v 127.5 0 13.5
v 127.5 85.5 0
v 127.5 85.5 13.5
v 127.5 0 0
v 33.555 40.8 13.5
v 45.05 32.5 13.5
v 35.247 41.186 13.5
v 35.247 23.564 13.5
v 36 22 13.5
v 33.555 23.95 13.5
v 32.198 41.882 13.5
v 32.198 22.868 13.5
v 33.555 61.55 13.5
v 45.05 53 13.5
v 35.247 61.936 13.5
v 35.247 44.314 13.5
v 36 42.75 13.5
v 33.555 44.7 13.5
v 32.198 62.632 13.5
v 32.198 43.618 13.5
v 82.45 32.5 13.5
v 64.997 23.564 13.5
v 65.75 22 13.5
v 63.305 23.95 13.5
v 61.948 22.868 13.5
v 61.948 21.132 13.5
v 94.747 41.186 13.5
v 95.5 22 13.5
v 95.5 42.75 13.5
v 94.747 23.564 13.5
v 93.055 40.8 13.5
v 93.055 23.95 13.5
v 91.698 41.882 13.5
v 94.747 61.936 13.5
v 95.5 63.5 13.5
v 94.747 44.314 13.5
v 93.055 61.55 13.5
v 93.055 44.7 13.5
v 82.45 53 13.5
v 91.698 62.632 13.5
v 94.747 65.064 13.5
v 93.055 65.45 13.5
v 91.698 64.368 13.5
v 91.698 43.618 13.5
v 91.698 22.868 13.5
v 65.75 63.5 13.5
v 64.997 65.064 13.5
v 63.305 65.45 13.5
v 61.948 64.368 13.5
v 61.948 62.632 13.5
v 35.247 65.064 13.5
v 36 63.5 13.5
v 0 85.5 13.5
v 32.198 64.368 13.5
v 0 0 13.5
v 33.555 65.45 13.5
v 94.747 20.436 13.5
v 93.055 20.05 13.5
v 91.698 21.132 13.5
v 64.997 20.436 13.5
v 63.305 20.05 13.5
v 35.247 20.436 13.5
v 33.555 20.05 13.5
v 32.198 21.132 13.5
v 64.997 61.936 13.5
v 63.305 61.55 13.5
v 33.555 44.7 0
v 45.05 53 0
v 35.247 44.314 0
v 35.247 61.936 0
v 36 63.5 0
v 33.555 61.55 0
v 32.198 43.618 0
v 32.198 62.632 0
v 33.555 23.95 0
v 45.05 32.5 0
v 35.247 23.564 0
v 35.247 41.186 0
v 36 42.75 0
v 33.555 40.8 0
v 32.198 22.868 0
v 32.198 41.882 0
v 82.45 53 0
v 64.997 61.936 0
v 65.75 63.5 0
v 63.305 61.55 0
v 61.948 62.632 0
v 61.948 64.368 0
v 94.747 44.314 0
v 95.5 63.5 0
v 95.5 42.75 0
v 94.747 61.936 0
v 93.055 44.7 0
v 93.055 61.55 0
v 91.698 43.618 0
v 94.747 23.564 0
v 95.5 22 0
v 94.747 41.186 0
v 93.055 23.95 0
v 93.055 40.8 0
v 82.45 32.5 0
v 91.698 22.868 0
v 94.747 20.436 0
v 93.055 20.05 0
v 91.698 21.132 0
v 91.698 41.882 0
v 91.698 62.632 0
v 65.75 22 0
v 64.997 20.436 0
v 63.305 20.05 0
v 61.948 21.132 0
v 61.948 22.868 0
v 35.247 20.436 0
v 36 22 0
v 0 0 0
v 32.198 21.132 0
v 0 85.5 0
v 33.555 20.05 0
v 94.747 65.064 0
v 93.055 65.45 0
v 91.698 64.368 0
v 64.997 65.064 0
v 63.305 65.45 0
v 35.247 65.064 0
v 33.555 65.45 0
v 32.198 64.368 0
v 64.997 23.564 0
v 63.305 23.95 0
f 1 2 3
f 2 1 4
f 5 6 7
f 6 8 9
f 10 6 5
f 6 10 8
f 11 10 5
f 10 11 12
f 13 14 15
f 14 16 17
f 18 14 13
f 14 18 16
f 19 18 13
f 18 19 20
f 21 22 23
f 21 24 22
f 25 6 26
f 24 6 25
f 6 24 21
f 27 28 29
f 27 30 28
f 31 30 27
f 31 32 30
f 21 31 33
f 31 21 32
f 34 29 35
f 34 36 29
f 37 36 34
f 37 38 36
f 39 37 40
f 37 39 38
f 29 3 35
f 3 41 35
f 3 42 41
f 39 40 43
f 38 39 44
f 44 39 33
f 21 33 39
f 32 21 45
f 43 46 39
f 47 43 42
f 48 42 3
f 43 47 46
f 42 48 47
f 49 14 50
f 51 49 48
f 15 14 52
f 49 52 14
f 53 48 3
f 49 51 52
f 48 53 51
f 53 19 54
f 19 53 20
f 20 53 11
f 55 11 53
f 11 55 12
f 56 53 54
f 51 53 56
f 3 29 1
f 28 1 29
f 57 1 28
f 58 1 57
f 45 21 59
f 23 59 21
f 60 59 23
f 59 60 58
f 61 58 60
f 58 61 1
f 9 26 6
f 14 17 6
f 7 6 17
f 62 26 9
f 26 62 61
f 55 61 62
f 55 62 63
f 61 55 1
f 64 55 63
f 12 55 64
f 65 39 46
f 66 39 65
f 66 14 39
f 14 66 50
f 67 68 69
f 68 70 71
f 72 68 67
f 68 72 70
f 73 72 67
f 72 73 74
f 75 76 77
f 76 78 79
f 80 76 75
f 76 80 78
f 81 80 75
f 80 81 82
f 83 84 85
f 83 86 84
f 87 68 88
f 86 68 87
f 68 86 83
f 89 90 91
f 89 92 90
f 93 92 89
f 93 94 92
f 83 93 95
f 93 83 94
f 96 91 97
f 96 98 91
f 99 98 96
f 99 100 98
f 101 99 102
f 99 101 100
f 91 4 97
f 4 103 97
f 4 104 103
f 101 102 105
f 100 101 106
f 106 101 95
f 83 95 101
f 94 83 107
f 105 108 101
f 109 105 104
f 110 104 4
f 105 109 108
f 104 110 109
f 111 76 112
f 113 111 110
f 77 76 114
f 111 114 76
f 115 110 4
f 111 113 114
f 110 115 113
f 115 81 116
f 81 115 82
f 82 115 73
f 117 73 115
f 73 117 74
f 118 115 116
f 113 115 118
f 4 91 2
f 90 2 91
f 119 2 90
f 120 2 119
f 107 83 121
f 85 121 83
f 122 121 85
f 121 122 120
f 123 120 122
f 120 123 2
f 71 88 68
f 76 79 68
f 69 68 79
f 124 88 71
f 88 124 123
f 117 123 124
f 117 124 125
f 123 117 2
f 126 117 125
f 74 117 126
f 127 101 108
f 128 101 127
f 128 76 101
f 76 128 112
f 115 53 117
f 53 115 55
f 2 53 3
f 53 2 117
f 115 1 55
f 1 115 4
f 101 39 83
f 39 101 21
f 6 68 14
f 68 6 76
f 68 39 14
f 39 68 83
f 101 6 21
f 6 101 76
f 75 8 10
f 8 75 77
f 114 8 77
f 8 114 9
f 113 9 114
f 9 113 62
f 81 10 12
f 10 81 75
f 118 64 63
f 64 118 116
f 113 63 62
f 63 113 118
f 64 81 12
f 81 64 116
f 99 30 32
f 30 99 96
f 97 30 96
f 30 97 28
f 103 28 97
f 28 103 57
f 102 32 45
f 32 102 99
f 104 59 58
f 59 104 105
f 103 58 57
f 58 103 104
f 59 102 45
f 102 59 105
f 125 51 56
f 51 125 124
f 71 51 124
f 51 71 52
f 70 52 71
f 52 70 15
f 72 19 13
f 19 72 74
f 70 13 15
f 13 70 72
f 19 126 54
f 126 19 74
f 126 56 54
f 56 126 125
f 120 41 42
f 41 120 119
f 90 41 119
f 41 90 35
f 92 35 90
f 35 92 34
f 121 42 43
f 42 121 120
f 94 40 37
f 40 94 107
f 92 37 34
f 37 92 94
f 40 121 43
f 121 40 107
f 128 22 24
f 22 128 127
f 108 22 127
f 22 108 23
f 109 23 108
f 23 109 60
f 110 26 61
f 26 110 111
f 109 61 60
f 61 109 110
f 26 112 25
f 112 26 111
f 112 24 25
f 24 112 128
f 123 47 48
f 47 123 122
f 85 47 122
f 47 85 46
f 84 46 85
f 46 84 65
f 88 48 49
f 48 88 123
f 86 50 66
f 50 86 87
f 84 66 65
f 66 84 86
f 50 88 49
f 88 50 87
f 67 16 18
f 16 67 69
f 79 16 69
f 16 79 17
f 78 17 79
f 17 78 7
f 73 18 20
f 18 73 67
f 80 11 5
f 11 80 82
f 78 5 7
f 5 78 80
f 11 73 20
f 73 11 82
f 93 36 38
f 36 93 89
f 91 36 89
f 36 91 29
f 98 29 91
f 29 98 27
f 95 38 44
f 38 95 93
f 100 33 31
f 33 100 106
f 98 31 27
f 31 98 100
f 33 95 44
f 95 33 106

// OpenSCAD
uF_w = 47.4;
uF_l = 30.5;
uF_h = 5.5;
holder_edge_from_uF_edge = 15;     // Must be > 15
holder_overhang_into_uF_edge = 5;



h = 8;
l = 85.5;
w = 127.5;
screw_hole_r = 4/2;
screw_from_edge = 22;

    difference() {
    cube([w, l, h+uF_h]);
    /*    Don't need because chip will sit flush with this top piece
       // Lower sides
        translate([0,l/2,h+uF_h])
            cube([holder_edge_from_uF_edge*2,l+1,uF_h*2], center = true);
        
        translate([w,l/2,h+uF_h])
            cube([holder_edge_from_uF_edge*2,l+1,uF_h*2], center = true);
        
        translate([w/2,0,h+uF_h])
            cube([w+1,holder_edge_from_uF_edge*2,uF_h*2], center = true);
        
        translate([w/2,l,h+uF_h])
            cube([w+1,holder_edge_from_uF_edge*2,uF_h*2], center = true);
        */
        
       // uF Hole
       translate([w/2, l/2, h/2]) 
        cube([uF_w-holder_overhang_into_uF_edge*2, uF_l-holder_overhang_into_uF_edge*2, 500], center = true);
        
       // Bottom Left hole
       translate([screw_from_edge+12, screw_from_edge, 0]) 
    cylinder(h = 50, r = screw_hole_r);
        
       // Bottom Right hole
       translate([w-screw_from_edge-12, screw_from_edge, 0]) 
    cylinder(h = 50, r = screw_hole_r);
        
       // Top Left hole
       translate([screw_from_edge+12, l-screw_from_edge, 0]) 
    cylinder(h = 50, r = screw_hole_r);
        
       // Top Right hole
       translate([w-screw_from_edge-12, l-screw_from_edge, 0]) 
    cylinder(h = 50, r = screw_hole_r);
        
       // Bottom Middle hole
       translate([w/2, screw_from_edge, 0]) 
    cylinder(h = 50, r = screw_hole_r);

       // Top Middle hole
       translate([w/2, l-screw_from_edge, 0]) 
    cylinder(h = 50, r = screw_hole_r);
        
       // Left Middle hole
       translate([screw_from_edge+12, l/2, 0]) 
    cylinder(h = 50, r = screw_hole_r);

       // Right Middle hole
       translate([w-screw_from_edge-12, l/2, 0]) 
    cylinder(h = 50, r = screw_hole_r);
    }
